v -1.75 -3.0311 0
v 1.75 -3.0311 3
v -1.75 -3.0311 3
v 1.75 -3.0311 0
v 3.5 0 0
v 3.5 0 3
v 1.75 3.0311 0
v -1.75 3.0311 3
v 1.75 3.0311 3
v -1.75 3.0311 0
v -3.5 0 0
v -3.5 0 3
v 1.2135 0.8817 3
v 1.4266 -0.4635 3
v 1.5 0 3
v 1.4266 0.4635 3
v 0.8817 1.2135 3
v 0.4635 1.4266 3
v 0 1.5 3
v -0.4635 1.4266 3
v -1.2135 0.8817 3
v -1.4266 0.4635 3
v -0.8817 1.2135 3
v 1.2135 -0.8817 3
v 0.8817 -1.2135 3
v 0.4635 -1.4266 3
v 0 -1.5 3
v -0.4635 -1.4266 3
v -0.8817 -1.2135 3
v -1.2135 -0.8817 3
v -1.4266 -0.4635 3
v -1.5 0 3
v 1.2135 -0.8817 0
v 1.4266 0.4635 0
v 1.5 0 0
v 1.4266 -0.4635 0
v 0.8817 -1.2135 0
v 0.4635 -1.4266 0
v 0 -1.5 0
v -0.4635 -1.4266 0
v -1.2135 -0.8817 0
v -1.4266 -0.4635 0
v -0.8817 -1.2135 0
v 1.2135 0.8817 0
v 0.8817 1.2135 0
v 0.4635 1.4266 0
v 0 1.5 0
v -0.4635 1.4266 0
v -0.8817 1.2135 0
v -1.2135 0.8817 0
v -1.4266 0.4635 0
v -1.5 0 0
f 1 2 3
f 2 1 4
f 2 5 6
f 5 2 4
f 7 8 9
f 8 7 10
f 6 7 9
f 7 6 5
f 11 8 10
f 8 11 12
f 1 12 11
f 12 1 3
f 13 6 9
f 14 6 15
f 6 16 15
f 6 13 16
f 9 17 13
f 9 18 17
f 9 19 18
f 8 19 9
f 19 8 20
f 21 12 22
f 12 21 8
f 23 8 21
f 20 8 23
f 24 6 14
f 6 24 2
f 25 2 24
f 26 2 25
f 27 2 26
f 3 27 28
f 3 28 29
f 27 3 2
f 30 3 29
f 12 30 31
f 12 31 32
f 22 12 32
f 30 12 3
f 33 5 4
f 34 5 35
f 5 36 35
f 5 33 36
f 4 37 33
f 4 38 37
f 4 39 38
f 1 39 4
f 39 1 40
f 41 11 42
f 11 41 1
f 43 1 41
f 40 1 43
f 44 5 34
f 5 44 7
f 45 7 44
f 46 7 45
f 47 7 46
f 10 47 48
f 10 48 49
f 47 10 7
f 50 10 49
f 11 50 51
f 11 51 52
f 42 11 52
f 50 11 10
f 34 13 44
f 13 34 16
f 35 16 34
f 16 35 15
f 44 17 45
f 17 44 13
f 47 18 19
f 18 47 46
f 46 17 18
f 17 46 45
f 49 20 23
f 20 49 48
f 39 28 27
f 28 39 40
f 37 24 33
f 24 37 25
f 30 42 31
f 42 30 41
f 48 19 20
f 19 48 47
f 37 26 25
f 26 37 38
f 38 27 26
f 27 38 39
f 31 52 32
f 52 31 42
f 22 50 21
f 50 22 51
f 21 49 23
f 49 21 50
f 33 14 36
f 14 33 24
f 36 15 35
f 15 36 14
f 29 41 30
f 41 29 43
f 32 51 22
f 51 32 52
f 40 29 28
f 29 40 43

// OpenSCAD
wall_thick = 2; // wall thickness around hole
screw_dia = 2.5; // screw diameter in mm
tolerance = .5; // hole clearance (diameter)
hole_r = (screw_dia+tolerance)/2;
height = 3;

module standoff(){
	difference()
	{
		cylinder(r=hole_r+wall_thick, h=height,$fn=6);
		translate([0,0,-1])cylinder(r=hole_r, h=height+2,$fn=20);
	}
}

standoff();
